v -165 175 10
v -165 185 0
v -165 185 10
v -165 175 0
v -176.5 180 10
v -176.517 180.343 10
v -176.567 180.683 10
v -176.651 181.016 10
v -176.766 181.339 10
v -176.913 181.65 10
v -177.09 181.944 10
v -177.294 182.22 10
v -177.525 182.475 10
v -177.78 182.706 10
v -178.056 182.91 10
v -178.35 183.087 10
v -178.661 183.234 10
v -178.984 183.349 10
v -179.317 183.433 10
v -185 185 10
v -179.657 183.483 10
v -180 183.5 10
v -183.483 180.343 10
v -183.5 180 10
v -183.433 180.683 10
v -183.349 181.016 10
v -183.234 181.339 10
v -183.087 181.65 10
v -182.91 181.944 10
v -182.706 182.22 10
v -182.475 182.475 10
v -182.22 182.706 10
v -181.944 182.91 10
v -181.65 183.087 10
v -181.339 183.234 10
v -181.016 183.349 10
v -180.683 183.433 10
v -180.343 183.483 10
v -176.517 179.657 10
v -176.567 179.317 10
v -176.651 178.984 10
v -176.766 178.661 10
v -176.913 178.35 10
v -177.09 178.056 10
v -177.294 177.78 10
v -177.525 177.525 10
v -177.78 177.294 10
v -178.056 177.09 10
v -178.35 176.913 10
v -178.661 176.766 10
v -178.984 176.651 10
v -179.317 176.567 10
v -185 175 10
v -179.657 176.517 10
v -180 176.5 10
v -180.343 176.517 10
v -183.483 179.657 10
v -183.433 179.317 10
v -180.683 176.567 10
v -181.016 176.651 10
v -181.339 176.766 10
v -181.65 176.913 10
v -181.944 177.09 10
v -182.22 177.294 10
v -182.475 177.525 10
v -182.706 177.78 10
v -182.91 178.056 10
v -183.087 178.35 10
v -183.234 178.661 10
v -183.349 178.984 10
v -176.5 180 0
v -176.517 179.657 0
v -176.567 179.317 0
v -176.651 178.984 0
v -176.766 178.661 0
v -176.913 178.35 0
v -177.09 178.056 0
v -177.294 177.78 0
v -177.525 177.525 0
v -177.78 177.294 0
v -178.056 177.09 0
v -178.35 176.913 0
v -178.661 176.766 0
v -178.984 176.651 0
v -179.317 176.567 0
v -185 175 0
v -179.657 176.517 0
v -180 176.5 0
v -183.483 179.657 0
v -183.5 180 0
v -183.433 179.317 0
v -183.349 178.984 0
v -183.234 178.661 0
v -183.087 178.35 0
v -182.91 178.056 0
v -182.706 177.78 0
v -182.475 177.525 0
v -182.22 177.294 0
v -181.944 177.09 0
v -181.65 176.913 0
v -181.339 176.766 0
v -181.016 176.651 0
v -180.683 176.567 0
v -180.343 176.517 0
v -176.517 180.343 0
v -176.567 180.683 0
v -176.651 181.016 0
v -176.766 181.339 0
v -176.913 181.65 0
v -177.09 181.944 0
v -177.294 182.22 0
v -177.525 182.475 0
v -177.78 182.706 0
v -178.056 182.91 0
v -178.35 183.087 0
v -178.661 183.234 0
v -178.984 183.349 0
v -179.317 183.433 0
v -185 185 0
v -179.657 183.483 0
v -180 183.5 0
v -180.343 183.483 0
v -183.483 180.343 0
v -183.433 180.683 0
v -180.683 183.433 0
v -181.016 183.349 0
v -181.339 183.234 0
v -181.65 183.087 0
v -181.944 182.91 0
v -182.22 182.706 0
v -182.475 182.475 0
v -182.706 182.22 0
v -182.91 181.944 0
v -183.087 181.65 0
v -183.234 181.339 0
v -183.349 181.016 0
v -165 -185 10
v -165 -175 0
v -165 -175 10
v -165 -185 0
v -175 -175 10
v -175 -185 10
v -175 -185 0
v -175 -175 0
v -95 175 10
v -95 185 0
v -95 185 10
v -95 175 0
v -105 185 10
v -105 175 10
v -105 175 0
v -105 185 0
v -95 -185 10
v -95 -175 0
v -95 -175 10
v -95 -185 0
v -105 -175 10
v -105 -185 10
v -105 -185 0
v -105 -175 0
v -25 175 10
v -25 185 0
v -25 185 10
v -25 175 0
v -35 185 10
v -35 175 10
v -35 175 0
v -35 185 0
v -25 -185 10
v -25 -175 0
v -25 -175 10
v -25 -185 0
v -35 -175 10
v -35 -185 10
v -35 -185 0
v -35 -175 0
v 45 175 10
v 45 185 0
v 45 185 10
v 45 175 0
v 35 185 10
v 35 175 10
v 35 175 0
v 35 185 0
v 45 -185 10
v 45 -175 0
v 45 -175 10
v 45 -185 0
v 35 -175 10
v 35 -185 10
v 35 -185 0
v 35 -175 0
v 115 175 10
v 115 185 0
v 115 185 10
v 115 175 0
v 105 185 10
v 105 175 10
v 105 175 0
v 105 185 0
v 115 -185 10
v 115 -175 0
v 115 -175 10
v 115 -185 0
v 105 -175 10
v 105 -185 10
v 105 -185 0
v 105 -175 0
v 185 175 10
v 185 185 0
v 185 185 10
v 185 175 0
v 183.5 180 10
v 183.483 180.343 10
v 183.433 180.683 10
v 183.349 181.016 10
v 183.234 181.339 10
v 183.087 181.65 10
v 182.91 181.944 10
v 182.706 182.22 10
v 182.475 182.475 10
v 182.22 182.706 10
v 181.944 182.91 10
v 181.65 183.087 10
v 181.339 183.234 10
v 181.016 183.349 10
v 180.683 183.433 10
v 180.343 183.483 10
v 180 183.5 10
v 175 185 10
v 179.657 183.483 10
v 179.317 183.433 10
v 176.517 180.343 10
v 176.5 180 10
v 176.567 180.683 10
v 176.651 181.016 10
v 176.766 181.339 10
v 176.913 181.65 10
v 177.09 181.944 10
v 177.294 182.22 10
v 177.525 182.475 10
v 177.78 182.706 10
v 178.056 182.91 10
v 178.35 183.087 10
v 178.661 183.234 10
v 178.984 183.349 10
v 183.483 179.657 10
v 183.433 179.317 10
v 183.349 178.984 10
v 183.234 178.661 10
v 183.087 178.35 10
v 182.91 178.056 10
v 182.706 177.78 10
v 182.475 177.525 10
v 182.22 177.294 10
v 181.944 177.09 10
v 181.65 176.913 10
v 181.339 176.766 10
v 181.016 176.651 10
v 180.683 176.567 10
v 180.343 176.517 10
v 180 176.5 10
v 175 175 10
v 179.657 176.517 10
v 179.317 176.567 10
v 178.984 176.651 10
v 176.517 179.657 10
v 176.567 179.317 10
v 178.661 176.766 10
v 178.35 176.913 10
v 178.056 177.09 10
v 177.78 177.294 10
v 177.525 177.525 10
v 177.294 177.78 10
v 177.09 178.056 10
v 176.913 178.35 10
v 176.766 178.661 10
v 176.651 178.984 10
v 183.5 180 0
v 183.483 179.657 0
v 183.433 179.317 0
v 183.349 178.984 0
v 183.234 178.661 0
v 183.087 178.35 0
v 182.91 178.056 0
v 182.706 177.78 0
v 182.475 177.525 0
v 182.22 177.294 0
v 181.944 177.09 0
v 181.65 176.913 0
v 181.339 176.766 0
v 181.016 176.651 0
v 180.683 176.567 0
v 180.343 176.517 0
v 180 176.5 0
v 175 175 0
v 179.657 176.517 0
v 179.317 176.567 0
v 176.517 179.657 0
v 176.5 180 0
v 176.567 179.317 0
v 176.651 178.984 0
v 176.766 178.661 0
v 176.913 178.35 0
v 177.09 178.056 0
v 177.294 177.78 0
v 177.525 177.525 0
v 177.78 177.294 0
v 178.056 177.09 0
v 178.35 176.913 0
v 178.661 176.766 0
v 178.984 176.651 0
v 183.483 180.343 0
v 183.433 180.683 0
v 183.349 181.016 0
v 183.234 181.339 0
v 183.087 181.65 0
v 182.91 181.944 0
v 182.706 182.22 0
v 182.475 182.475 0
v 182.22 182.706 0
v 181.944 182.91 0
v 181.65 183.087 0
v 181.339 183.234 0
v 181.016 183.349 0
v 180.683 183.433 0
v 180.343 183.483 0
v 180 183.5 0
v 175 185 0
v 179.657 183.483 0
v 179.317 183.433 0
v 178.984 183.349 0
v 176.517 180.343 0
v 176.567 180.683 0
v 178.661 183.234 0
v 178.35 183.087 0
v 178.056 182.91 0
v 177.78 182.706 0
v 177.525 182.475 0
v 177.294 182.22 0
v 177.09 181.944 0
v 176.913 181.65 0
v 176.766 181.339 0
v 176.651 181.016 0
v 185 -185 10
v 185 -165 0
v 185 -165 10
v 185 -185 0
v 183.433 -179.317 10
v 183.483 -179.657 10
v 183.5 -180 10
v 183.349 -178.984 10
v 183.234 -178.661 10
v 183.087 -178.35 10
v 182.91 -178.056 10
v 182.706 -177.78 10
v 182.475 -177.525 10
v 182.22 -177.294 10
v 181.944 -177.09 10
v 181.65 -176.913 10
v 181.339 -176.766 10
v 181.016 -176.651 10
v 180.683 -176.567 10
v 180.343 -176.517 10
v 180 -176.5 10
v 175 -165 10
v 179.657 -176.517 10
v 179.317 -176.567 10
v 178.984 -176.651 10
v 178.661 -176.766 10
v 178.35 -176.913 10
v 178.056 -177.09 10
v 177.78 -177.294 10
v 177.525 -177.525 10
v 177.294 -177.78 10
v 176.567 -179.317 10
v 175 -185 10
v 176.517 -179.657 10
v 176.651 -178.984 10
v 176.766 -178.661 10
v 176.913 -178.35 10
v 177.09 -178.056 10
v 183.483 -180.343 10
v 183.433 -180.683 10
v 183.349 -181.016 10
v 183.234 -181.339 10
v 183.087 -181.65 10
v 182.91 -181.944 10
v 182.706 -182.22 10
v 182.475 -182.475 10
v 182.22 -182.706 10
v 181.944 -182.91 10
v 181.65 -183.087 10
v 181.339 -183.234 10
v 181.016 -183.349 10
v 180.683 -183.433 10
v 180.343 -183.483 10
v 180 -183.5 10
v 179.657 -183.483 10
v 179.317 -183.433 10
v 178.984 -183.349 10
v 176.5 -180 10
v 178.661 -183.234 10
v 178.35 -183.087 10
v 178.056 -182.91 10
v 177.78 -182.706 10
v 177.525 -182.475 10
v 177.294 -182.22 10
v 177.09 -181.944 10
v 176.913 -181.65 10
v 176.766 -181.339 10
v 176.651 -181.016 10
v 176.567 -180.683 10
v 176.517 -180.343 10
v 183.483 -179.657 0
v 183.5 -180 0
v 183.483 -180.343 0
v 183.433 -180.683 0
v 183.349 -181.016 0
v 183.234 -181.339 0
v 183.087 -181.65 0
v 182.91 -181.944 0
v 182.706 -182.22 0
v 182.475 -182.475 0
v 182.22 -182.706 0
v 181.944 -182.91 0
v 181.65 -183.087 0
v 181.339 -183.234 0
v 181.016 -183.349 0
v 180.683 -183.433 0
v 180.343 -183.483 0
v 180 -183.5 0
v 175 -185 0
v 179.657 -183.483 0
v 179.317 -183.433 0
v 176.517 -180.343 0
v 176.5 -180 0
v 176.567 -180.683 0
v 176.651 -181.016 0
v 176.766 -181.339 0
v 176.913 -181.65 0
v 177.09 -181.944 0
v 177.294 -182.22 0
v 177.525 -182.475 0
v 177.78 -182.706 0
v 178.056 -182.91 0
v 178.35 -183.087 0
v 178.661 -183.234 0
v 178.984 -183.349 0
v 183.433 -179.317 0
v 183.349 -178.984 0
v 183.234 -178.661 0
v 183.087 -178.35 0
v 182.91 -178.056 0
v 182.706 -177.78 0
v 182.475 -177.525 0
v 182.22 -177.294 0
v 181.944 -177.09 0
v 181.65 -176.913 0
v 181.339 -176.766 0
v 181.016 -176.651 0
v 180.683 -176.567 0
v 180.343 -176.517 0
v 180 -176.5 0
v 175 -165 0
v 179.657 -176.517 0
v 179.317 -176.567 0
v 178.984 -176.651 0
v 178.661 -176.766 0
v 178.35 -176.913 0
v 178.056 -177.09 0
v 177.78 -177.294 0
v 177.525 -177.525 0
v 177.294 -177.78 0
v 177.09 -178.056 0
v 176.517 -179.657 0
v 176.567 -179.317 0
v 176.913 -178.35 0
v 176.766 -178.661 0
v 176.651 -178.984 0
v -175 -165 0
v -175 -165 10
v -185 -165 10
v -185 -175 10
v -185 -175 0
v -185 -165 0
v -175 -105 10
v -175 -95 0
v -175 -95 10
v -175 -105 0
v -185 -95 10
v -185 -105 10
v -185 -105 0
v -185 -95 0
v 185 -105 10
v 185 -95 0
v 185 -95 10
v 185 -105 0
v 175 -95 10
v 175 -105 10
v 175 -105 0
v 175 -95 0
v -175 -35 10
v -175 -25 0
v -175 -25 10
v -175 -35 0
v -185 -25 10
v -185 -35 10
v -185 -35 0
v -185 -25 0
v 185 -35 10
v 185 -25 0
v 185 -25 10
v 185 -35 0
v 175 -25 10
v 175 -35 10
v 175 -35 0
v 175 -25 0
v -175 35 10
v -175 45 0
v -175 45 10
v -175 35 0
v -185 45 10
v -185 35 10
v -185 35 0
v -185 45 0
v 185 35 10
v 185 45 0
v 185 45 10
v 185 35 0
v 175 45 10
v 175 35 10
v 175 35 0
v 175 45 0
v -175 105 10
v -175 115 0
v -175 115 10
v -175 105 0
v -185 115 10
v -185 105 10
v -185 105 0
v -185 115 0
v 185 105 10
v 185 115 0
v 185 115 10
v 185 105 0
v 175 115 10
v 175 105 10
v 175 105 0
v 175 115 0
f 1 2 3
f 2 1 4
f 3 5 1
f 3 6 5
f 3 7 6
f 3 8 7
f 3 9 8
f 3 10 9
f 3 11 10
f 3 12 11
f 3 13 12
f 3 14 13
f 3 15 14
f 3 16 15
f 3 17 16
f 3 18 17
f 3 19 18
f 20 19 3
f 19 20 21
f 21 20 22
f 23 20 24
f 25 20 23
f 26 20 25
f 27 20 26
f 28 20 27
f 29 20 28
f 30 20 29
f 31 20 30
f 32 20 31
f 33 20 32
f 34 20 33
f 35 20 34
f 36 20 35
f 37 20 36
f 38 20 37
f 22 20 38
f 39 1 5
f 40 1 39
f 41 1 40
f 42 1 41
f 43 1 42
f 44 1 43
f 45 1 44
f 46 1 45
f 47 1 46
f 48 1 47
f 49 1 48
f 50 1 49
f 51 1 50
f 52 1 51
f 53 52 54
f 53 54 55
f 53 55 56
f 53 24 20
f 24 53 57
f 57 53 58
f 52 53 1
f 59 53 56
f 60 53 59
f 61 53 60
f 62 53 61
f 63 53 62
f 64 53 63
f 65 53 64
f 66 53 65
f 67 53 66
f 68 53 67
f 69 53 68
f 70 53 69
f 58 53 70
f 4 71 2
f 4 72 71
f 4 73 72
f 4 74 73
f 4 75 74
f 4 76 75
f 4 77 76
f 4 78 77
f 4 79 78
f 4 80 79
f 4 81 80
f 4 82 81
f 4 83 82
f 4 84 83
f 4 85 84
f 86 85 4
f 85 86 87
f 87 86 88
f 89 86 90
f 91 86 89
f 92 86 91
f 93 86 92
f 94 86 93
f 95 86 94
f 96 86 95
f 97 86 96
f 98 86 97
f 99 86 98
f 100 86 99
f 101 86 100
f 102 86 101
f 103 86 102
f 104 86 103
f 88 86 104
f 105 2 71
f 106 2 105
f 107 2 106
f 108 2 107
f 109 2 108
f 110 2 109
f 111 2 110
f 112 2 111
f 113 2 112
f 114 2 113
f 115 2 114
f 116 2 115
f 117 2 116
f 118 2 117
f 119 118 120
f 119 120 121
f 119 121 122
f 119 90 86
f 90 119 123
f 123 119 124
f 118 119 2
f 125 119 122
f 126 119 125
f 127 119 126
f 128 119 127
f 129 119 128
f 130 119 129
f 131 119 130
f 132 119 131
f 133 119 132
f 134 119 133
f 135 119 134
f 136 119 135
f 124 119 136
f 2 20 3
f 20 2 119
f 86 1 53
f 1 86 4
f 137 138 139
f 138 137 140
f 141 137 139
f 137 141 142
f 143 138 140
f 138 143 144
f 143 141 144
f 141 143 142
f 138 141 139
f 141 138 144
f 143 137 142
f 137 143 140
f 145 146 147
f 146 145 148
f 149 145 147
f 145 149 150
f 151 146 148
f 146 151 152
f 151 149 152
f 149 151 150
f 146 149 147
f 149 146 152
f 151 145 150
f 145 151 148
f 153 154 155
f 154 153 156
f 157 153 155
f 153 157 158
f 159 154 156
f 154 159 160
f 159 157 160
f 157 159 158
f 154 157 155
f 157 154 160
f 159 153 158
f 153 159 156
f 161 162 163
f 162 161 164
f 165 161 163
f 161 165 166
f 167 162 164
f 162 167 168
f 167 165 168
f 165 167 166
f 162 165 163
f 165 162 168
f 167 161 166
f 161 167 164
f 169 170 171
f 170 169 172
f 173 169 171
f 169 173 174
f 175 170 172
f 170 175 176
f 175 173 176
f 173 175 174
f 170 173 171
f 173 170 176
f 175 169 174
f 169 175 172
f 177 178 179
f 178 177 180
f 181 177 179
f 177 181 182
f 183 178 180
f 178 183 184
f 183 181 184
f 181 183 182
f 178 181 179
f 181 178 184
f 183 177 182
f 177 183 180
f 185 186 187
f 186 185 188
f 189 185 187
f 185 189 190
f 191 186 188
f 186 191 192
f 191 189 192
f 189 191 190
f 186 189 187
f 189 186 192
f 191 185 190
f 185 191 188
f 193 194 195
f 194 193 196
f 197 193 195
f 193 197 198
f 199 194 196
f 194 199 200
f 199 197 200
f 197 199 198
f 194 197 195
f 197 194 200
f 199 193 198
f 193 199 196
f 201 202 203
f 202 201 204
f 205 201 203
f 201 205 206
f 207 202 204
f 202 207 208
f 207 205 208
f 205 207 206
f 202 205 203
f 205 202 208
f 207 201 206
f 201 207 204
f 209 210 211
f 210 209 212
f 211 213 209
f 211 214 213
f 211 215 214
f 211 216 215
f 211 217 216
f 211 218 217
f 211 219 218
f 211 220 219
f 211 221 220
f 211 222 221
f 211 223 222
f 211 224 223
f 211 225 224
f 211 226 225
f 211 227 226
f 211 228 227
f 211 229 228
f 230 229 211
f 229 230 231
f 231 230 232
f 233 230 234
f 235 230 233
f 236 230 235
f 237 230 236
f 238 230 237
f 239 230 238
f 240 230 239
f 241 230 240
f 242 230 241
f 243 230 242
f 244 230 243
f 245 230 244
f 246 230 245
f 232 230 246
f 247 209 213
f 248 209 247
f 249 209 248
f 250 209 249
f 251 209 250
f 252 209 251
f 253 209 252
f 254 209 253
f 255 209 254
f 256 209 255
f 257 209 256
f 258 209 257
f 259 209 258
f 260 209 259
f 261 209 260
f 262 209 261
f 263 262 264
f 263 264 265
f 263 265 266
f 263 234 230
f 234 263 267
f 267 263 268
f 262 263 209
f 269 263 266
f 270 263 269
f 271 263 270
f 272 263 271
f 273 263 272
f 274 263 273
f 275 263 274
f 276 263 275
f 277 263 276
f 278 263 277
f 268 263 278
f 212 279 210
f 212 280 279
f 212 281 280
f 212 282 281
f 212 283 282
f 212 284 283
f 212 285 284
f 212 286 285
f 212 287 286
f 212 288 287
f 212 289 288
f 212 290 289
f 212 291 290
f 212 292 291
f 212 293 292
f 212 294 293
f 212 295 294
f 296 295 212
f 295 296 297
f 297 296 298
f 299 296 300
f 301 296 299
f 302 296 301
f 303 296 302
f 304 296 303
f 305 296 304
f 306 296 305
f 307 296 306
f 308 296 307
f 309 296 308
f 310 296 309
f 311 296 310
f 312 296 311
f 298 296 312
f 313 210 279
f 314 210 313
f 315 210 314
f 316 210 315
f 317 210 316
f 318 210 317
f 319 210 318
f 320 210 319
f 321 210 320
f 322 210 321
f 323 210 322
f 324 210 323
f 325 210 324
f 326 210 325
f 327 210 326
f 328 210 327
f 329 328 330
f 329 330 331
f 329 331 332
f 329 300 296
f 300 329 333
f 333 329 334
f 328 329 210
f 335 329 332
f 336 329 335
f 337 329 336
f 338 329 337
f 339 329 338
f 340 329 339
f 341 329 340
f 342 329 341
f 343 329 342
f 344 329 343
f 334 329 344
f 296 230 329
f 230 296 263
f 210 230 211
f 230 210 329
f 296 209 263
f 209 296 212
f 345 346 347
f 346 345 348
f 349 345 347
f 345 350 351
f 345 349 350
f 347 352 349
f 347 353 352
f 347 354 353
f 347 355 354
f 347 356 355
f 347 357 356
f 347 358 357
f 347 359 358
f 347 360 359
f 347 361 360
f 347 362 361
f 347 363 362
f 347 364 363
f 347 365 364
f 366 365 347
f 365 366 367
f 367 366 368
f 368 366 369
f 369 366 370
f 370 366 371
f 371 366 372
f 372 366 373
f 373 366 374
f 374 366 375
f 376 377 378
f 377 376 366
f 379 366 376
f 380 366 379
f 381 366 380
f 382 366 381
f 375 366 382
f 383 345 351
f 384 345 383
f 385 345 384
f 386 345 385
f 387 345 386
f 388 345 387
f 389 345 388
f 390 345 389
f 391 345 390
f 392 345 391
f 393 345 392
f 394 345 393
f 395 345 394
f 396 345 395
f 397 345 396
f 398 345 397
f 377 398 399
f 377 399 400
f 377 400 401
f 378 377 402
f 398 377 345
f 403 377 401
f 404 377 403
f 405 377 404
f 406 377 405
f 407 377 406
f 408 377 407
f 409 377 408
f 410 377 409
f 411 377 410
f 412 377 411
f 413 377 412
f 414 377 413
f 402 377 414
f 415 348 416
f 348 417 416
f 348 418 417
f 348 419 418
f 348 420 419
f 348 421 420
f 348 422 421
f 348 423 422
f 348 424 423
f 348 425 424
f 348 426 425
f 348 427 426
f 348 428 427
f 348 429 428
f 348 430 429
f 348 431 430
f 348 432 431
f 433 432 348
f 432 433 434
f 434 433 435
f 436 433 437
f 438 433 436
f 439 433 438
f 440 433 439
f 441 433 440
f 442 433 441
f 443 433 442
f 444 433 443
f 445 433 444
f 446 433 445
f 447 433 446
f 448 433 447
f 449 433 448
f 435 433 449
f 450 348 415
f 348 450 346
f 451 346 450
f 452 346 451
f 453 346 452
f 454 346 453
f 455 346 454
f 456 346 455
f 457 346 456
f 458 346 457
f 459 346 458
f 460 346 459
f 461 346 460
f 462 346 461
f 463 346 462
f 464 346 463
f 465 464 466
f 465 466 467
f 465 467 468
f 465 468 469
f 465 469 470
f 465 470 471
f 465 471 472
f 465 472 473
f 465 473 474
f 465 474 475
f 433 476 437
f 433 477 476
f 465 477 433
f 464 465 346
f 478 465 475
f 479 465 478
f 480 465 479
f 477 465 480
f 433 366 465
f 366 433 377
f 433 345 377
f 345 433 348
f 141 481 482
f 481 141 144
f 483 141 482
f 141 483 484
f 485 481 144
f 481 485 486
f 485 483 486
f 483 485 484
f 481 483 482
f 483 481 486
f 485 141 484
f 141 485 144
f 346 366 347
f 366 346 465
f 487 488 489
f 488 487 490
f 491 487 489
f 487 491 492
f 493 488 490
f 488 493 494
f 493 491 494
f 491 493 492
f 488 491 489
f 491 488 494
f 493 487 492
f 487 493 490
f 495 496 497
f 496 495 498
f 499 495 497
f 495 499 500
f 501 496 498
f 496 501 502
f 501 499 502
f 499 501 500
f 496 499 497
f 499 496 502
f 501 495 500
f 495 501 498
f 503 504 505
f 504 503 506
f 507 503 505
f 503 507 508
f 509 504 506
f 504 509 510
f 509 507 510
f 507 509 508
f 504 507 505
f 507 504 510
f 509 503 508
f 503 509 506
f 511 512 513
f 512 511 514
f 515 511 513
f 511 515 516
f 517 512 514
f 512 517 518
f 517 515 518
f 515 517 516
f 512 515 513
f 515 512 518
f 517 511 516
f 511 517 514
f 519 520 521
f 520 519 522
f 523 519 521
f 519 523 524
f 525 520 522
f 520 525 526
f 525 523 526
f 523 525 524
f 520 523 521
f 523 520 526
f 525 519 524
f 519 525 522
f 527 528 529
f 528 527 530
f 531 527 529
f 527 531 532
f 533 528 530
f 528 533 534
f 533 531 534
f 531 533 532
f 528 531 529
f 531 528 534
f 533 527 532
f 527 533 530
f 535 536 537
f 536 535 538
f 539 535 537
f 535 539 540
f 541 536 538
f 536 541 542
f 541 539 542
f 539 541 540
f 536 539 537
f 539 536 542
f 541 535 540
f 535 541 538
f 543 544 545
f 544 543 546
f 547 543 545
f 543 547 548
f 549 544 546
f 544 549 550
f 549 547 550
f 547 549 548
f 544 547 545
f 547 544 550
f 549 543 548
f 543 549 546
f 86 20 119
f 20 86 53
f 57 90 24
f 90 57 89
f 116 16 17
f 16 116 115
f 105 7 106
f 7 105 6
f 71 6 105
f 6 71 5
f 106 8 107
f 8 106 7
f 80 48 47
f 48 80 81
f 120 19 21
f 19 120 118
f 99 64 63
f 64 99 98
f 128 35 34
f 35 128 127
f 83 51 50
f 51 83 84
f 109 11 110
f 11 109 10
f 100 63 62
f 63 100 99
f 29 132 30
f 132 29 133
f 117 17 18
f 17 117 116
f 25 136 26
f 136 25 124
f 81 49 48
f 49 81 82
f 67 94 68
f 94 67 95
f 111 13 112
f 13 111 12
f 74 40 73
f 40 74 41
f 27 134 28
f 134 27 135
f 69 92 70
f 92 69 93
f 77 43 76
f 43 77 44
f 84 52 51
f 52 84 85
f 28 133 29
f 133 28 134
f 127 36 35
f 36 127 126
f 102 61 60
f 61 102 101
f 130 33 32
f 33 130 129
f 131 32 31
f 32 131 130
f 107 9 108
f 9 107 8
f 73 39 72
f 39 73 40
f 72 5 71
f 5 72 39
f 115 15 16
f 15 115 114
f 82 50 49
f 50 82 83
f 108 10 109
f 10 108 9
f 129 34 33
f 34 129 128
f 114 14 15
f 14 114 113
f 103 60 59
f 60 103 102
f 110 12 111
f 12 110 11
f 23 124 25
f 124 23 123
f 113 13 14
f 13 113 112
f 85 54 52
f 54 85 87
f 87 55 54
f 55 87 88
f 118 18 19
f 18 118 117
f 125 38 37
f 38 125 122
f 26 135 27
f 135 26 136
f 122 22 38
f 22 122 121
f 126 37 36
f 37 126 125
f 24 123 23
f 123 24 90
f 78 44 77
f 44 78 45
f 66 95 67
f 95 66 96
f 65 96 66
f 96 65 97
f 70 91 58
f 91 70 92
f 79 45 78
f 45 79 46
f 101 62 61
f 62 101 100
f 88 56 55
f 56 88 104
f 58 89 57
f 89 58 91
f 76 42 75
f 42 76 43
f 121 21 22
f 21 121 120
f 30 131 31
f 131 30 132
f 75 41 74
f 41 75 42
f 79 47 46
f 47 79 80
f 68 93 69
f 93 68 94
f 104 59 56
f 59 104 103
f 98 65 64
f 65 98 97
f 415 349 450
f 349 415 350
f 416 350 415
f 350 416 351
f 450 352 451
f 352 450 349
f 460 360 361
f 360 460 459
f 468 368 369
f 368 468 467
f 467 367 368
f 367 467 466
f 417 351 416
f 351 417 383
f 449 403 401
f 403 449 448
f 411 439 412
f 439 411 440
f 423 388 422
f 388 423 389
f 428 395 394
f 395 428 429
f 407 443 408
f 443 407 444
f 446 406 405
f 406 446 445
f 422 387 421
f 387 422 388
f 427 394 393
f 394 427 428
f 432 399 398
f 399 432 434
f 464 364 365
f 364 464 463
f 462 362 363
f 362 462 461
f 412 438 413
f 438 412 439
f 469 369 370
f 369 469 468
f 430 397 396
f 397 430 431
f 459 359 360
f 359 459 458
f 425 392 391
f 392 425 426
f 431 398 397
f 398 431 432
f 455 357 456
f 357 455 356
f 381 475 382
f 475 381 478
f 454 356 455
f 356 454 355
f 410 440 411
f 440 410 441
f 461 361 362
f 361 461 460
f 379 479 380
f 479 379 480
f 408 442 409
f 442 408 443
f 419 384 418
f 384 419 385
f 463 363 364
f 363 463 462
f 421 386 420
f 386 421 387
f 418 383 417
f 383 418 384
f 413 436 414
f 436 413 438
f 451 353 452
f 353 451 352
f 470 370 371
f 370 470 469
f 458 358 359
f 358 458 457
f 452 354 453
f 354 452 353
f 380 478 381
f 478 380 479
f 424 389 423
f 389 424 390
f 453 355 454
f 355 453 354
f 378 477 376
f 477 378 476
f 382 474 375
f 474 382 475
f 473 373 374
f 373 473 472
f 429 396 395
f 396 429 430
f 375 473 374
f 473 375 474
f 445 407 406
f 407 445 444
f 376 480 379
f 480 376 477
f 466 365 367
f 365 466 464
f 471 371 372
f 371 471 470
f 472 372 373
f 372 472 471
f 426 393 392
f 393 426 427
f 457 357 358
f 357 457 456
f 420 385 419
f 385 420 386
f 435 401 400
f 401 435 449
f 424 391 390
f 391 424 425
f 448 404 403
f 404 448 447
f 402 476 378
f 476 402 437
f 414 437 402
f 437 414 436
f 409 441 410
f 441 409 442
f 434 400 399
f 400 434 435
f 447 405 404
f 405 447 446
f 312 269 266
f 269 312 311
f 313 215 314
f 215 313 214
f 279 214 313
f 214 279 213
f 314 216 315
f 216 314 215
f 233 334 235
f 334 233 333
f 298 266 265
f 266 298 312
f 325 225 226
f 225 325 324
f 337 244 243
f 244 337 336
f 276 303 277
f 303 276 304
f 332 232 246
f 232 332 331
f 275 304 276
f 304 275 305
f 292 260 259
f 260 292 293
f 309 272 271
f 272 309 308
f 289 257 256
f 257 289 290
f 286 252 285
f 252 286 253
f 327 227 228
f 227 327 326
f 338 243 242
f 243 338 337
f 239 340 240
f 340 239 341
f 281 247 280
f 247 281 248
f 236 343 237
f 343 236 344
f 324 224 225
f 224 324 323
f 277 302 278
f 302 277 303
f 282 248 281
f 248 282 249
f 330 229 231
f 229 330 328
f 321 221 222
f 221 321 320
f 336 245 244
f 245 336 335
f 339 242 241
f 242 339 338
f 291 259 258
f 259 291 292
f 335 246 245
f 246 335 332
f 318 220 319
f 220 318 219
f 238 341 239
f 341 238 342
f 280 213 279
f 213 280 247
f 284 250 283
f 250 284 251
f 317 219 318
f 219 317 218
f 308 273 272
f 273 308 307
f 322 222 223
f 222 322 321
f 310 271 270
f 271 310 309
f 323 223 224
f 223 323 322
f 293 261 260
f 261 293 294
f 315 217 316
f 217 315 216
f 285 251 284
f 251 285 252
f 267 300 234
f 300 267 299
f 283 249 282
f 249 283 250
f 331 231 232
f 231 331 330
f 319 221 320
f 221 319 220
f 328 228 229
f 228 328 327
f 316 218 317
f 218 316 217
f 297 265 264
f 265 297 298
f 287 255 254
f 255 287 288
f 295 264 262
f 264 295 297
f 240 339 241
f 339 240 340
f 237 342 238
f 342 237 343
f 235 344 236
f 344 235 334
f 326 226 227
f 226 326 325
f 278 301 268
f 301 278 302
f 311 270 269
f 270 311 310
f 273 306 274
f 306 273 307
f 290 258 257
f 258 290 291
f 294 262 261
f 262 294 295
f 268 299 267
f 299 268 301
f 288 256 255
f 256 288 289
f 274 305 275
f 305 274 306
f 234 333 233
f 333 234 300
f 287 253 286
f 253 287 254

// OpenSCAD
// ring_20.scad - ring index 20 (z bottom = 200 mm)
$fn = 64; bar = 10; half_b = bar/2; outer = 370; half_outer = outer/2;
front_y = 180; back_y = -180; left_x = -180; right_x = 180;
x_centers = [-170, -100, -30, 40, 110, 180];
z_centers = [5, 85, 155, 225, 295, 365, 435, 505, 575, 645, 715]; ring_z = 200;
module place_box(cx, cy, sx, sy) { translate([cx - sx/2, cy - sy/2, 0]) cube([sx, sy, bar]); }

difference() { union() {
    for (x = x_centers) { place_box(x, front_y, bar, bar); place_box(x, back_y, bar, bar); }
    for (y = x_centers) { place_box(left_x, y, bar, bar); place_box(right_x, y, bar, bar); }
    for (zc = z_centers) if ((zc - half_b < ring_z + bar) && (zc + half_b > ring_z)) {
        translate([-half_outer, front_y - half_b, 0]) cube([outer, bar, bar]);
        translate([-half_outer, back_y - half_b, 0])  cube([outer, bar, bar]);
        translate([left_x - half_b, -half_outer, 0])  cube([bar, outer, bar]);
        translate([right_x - half_b, -half_outer, 0]) cube([bar, outer, bar]);
    }
  }
  for (cx = [-180, 180]) for (cy = [-180, 180]) translate([cx, cy, 0]) cylinder(h = bar, r = 3.5, $fn = 64);
}
